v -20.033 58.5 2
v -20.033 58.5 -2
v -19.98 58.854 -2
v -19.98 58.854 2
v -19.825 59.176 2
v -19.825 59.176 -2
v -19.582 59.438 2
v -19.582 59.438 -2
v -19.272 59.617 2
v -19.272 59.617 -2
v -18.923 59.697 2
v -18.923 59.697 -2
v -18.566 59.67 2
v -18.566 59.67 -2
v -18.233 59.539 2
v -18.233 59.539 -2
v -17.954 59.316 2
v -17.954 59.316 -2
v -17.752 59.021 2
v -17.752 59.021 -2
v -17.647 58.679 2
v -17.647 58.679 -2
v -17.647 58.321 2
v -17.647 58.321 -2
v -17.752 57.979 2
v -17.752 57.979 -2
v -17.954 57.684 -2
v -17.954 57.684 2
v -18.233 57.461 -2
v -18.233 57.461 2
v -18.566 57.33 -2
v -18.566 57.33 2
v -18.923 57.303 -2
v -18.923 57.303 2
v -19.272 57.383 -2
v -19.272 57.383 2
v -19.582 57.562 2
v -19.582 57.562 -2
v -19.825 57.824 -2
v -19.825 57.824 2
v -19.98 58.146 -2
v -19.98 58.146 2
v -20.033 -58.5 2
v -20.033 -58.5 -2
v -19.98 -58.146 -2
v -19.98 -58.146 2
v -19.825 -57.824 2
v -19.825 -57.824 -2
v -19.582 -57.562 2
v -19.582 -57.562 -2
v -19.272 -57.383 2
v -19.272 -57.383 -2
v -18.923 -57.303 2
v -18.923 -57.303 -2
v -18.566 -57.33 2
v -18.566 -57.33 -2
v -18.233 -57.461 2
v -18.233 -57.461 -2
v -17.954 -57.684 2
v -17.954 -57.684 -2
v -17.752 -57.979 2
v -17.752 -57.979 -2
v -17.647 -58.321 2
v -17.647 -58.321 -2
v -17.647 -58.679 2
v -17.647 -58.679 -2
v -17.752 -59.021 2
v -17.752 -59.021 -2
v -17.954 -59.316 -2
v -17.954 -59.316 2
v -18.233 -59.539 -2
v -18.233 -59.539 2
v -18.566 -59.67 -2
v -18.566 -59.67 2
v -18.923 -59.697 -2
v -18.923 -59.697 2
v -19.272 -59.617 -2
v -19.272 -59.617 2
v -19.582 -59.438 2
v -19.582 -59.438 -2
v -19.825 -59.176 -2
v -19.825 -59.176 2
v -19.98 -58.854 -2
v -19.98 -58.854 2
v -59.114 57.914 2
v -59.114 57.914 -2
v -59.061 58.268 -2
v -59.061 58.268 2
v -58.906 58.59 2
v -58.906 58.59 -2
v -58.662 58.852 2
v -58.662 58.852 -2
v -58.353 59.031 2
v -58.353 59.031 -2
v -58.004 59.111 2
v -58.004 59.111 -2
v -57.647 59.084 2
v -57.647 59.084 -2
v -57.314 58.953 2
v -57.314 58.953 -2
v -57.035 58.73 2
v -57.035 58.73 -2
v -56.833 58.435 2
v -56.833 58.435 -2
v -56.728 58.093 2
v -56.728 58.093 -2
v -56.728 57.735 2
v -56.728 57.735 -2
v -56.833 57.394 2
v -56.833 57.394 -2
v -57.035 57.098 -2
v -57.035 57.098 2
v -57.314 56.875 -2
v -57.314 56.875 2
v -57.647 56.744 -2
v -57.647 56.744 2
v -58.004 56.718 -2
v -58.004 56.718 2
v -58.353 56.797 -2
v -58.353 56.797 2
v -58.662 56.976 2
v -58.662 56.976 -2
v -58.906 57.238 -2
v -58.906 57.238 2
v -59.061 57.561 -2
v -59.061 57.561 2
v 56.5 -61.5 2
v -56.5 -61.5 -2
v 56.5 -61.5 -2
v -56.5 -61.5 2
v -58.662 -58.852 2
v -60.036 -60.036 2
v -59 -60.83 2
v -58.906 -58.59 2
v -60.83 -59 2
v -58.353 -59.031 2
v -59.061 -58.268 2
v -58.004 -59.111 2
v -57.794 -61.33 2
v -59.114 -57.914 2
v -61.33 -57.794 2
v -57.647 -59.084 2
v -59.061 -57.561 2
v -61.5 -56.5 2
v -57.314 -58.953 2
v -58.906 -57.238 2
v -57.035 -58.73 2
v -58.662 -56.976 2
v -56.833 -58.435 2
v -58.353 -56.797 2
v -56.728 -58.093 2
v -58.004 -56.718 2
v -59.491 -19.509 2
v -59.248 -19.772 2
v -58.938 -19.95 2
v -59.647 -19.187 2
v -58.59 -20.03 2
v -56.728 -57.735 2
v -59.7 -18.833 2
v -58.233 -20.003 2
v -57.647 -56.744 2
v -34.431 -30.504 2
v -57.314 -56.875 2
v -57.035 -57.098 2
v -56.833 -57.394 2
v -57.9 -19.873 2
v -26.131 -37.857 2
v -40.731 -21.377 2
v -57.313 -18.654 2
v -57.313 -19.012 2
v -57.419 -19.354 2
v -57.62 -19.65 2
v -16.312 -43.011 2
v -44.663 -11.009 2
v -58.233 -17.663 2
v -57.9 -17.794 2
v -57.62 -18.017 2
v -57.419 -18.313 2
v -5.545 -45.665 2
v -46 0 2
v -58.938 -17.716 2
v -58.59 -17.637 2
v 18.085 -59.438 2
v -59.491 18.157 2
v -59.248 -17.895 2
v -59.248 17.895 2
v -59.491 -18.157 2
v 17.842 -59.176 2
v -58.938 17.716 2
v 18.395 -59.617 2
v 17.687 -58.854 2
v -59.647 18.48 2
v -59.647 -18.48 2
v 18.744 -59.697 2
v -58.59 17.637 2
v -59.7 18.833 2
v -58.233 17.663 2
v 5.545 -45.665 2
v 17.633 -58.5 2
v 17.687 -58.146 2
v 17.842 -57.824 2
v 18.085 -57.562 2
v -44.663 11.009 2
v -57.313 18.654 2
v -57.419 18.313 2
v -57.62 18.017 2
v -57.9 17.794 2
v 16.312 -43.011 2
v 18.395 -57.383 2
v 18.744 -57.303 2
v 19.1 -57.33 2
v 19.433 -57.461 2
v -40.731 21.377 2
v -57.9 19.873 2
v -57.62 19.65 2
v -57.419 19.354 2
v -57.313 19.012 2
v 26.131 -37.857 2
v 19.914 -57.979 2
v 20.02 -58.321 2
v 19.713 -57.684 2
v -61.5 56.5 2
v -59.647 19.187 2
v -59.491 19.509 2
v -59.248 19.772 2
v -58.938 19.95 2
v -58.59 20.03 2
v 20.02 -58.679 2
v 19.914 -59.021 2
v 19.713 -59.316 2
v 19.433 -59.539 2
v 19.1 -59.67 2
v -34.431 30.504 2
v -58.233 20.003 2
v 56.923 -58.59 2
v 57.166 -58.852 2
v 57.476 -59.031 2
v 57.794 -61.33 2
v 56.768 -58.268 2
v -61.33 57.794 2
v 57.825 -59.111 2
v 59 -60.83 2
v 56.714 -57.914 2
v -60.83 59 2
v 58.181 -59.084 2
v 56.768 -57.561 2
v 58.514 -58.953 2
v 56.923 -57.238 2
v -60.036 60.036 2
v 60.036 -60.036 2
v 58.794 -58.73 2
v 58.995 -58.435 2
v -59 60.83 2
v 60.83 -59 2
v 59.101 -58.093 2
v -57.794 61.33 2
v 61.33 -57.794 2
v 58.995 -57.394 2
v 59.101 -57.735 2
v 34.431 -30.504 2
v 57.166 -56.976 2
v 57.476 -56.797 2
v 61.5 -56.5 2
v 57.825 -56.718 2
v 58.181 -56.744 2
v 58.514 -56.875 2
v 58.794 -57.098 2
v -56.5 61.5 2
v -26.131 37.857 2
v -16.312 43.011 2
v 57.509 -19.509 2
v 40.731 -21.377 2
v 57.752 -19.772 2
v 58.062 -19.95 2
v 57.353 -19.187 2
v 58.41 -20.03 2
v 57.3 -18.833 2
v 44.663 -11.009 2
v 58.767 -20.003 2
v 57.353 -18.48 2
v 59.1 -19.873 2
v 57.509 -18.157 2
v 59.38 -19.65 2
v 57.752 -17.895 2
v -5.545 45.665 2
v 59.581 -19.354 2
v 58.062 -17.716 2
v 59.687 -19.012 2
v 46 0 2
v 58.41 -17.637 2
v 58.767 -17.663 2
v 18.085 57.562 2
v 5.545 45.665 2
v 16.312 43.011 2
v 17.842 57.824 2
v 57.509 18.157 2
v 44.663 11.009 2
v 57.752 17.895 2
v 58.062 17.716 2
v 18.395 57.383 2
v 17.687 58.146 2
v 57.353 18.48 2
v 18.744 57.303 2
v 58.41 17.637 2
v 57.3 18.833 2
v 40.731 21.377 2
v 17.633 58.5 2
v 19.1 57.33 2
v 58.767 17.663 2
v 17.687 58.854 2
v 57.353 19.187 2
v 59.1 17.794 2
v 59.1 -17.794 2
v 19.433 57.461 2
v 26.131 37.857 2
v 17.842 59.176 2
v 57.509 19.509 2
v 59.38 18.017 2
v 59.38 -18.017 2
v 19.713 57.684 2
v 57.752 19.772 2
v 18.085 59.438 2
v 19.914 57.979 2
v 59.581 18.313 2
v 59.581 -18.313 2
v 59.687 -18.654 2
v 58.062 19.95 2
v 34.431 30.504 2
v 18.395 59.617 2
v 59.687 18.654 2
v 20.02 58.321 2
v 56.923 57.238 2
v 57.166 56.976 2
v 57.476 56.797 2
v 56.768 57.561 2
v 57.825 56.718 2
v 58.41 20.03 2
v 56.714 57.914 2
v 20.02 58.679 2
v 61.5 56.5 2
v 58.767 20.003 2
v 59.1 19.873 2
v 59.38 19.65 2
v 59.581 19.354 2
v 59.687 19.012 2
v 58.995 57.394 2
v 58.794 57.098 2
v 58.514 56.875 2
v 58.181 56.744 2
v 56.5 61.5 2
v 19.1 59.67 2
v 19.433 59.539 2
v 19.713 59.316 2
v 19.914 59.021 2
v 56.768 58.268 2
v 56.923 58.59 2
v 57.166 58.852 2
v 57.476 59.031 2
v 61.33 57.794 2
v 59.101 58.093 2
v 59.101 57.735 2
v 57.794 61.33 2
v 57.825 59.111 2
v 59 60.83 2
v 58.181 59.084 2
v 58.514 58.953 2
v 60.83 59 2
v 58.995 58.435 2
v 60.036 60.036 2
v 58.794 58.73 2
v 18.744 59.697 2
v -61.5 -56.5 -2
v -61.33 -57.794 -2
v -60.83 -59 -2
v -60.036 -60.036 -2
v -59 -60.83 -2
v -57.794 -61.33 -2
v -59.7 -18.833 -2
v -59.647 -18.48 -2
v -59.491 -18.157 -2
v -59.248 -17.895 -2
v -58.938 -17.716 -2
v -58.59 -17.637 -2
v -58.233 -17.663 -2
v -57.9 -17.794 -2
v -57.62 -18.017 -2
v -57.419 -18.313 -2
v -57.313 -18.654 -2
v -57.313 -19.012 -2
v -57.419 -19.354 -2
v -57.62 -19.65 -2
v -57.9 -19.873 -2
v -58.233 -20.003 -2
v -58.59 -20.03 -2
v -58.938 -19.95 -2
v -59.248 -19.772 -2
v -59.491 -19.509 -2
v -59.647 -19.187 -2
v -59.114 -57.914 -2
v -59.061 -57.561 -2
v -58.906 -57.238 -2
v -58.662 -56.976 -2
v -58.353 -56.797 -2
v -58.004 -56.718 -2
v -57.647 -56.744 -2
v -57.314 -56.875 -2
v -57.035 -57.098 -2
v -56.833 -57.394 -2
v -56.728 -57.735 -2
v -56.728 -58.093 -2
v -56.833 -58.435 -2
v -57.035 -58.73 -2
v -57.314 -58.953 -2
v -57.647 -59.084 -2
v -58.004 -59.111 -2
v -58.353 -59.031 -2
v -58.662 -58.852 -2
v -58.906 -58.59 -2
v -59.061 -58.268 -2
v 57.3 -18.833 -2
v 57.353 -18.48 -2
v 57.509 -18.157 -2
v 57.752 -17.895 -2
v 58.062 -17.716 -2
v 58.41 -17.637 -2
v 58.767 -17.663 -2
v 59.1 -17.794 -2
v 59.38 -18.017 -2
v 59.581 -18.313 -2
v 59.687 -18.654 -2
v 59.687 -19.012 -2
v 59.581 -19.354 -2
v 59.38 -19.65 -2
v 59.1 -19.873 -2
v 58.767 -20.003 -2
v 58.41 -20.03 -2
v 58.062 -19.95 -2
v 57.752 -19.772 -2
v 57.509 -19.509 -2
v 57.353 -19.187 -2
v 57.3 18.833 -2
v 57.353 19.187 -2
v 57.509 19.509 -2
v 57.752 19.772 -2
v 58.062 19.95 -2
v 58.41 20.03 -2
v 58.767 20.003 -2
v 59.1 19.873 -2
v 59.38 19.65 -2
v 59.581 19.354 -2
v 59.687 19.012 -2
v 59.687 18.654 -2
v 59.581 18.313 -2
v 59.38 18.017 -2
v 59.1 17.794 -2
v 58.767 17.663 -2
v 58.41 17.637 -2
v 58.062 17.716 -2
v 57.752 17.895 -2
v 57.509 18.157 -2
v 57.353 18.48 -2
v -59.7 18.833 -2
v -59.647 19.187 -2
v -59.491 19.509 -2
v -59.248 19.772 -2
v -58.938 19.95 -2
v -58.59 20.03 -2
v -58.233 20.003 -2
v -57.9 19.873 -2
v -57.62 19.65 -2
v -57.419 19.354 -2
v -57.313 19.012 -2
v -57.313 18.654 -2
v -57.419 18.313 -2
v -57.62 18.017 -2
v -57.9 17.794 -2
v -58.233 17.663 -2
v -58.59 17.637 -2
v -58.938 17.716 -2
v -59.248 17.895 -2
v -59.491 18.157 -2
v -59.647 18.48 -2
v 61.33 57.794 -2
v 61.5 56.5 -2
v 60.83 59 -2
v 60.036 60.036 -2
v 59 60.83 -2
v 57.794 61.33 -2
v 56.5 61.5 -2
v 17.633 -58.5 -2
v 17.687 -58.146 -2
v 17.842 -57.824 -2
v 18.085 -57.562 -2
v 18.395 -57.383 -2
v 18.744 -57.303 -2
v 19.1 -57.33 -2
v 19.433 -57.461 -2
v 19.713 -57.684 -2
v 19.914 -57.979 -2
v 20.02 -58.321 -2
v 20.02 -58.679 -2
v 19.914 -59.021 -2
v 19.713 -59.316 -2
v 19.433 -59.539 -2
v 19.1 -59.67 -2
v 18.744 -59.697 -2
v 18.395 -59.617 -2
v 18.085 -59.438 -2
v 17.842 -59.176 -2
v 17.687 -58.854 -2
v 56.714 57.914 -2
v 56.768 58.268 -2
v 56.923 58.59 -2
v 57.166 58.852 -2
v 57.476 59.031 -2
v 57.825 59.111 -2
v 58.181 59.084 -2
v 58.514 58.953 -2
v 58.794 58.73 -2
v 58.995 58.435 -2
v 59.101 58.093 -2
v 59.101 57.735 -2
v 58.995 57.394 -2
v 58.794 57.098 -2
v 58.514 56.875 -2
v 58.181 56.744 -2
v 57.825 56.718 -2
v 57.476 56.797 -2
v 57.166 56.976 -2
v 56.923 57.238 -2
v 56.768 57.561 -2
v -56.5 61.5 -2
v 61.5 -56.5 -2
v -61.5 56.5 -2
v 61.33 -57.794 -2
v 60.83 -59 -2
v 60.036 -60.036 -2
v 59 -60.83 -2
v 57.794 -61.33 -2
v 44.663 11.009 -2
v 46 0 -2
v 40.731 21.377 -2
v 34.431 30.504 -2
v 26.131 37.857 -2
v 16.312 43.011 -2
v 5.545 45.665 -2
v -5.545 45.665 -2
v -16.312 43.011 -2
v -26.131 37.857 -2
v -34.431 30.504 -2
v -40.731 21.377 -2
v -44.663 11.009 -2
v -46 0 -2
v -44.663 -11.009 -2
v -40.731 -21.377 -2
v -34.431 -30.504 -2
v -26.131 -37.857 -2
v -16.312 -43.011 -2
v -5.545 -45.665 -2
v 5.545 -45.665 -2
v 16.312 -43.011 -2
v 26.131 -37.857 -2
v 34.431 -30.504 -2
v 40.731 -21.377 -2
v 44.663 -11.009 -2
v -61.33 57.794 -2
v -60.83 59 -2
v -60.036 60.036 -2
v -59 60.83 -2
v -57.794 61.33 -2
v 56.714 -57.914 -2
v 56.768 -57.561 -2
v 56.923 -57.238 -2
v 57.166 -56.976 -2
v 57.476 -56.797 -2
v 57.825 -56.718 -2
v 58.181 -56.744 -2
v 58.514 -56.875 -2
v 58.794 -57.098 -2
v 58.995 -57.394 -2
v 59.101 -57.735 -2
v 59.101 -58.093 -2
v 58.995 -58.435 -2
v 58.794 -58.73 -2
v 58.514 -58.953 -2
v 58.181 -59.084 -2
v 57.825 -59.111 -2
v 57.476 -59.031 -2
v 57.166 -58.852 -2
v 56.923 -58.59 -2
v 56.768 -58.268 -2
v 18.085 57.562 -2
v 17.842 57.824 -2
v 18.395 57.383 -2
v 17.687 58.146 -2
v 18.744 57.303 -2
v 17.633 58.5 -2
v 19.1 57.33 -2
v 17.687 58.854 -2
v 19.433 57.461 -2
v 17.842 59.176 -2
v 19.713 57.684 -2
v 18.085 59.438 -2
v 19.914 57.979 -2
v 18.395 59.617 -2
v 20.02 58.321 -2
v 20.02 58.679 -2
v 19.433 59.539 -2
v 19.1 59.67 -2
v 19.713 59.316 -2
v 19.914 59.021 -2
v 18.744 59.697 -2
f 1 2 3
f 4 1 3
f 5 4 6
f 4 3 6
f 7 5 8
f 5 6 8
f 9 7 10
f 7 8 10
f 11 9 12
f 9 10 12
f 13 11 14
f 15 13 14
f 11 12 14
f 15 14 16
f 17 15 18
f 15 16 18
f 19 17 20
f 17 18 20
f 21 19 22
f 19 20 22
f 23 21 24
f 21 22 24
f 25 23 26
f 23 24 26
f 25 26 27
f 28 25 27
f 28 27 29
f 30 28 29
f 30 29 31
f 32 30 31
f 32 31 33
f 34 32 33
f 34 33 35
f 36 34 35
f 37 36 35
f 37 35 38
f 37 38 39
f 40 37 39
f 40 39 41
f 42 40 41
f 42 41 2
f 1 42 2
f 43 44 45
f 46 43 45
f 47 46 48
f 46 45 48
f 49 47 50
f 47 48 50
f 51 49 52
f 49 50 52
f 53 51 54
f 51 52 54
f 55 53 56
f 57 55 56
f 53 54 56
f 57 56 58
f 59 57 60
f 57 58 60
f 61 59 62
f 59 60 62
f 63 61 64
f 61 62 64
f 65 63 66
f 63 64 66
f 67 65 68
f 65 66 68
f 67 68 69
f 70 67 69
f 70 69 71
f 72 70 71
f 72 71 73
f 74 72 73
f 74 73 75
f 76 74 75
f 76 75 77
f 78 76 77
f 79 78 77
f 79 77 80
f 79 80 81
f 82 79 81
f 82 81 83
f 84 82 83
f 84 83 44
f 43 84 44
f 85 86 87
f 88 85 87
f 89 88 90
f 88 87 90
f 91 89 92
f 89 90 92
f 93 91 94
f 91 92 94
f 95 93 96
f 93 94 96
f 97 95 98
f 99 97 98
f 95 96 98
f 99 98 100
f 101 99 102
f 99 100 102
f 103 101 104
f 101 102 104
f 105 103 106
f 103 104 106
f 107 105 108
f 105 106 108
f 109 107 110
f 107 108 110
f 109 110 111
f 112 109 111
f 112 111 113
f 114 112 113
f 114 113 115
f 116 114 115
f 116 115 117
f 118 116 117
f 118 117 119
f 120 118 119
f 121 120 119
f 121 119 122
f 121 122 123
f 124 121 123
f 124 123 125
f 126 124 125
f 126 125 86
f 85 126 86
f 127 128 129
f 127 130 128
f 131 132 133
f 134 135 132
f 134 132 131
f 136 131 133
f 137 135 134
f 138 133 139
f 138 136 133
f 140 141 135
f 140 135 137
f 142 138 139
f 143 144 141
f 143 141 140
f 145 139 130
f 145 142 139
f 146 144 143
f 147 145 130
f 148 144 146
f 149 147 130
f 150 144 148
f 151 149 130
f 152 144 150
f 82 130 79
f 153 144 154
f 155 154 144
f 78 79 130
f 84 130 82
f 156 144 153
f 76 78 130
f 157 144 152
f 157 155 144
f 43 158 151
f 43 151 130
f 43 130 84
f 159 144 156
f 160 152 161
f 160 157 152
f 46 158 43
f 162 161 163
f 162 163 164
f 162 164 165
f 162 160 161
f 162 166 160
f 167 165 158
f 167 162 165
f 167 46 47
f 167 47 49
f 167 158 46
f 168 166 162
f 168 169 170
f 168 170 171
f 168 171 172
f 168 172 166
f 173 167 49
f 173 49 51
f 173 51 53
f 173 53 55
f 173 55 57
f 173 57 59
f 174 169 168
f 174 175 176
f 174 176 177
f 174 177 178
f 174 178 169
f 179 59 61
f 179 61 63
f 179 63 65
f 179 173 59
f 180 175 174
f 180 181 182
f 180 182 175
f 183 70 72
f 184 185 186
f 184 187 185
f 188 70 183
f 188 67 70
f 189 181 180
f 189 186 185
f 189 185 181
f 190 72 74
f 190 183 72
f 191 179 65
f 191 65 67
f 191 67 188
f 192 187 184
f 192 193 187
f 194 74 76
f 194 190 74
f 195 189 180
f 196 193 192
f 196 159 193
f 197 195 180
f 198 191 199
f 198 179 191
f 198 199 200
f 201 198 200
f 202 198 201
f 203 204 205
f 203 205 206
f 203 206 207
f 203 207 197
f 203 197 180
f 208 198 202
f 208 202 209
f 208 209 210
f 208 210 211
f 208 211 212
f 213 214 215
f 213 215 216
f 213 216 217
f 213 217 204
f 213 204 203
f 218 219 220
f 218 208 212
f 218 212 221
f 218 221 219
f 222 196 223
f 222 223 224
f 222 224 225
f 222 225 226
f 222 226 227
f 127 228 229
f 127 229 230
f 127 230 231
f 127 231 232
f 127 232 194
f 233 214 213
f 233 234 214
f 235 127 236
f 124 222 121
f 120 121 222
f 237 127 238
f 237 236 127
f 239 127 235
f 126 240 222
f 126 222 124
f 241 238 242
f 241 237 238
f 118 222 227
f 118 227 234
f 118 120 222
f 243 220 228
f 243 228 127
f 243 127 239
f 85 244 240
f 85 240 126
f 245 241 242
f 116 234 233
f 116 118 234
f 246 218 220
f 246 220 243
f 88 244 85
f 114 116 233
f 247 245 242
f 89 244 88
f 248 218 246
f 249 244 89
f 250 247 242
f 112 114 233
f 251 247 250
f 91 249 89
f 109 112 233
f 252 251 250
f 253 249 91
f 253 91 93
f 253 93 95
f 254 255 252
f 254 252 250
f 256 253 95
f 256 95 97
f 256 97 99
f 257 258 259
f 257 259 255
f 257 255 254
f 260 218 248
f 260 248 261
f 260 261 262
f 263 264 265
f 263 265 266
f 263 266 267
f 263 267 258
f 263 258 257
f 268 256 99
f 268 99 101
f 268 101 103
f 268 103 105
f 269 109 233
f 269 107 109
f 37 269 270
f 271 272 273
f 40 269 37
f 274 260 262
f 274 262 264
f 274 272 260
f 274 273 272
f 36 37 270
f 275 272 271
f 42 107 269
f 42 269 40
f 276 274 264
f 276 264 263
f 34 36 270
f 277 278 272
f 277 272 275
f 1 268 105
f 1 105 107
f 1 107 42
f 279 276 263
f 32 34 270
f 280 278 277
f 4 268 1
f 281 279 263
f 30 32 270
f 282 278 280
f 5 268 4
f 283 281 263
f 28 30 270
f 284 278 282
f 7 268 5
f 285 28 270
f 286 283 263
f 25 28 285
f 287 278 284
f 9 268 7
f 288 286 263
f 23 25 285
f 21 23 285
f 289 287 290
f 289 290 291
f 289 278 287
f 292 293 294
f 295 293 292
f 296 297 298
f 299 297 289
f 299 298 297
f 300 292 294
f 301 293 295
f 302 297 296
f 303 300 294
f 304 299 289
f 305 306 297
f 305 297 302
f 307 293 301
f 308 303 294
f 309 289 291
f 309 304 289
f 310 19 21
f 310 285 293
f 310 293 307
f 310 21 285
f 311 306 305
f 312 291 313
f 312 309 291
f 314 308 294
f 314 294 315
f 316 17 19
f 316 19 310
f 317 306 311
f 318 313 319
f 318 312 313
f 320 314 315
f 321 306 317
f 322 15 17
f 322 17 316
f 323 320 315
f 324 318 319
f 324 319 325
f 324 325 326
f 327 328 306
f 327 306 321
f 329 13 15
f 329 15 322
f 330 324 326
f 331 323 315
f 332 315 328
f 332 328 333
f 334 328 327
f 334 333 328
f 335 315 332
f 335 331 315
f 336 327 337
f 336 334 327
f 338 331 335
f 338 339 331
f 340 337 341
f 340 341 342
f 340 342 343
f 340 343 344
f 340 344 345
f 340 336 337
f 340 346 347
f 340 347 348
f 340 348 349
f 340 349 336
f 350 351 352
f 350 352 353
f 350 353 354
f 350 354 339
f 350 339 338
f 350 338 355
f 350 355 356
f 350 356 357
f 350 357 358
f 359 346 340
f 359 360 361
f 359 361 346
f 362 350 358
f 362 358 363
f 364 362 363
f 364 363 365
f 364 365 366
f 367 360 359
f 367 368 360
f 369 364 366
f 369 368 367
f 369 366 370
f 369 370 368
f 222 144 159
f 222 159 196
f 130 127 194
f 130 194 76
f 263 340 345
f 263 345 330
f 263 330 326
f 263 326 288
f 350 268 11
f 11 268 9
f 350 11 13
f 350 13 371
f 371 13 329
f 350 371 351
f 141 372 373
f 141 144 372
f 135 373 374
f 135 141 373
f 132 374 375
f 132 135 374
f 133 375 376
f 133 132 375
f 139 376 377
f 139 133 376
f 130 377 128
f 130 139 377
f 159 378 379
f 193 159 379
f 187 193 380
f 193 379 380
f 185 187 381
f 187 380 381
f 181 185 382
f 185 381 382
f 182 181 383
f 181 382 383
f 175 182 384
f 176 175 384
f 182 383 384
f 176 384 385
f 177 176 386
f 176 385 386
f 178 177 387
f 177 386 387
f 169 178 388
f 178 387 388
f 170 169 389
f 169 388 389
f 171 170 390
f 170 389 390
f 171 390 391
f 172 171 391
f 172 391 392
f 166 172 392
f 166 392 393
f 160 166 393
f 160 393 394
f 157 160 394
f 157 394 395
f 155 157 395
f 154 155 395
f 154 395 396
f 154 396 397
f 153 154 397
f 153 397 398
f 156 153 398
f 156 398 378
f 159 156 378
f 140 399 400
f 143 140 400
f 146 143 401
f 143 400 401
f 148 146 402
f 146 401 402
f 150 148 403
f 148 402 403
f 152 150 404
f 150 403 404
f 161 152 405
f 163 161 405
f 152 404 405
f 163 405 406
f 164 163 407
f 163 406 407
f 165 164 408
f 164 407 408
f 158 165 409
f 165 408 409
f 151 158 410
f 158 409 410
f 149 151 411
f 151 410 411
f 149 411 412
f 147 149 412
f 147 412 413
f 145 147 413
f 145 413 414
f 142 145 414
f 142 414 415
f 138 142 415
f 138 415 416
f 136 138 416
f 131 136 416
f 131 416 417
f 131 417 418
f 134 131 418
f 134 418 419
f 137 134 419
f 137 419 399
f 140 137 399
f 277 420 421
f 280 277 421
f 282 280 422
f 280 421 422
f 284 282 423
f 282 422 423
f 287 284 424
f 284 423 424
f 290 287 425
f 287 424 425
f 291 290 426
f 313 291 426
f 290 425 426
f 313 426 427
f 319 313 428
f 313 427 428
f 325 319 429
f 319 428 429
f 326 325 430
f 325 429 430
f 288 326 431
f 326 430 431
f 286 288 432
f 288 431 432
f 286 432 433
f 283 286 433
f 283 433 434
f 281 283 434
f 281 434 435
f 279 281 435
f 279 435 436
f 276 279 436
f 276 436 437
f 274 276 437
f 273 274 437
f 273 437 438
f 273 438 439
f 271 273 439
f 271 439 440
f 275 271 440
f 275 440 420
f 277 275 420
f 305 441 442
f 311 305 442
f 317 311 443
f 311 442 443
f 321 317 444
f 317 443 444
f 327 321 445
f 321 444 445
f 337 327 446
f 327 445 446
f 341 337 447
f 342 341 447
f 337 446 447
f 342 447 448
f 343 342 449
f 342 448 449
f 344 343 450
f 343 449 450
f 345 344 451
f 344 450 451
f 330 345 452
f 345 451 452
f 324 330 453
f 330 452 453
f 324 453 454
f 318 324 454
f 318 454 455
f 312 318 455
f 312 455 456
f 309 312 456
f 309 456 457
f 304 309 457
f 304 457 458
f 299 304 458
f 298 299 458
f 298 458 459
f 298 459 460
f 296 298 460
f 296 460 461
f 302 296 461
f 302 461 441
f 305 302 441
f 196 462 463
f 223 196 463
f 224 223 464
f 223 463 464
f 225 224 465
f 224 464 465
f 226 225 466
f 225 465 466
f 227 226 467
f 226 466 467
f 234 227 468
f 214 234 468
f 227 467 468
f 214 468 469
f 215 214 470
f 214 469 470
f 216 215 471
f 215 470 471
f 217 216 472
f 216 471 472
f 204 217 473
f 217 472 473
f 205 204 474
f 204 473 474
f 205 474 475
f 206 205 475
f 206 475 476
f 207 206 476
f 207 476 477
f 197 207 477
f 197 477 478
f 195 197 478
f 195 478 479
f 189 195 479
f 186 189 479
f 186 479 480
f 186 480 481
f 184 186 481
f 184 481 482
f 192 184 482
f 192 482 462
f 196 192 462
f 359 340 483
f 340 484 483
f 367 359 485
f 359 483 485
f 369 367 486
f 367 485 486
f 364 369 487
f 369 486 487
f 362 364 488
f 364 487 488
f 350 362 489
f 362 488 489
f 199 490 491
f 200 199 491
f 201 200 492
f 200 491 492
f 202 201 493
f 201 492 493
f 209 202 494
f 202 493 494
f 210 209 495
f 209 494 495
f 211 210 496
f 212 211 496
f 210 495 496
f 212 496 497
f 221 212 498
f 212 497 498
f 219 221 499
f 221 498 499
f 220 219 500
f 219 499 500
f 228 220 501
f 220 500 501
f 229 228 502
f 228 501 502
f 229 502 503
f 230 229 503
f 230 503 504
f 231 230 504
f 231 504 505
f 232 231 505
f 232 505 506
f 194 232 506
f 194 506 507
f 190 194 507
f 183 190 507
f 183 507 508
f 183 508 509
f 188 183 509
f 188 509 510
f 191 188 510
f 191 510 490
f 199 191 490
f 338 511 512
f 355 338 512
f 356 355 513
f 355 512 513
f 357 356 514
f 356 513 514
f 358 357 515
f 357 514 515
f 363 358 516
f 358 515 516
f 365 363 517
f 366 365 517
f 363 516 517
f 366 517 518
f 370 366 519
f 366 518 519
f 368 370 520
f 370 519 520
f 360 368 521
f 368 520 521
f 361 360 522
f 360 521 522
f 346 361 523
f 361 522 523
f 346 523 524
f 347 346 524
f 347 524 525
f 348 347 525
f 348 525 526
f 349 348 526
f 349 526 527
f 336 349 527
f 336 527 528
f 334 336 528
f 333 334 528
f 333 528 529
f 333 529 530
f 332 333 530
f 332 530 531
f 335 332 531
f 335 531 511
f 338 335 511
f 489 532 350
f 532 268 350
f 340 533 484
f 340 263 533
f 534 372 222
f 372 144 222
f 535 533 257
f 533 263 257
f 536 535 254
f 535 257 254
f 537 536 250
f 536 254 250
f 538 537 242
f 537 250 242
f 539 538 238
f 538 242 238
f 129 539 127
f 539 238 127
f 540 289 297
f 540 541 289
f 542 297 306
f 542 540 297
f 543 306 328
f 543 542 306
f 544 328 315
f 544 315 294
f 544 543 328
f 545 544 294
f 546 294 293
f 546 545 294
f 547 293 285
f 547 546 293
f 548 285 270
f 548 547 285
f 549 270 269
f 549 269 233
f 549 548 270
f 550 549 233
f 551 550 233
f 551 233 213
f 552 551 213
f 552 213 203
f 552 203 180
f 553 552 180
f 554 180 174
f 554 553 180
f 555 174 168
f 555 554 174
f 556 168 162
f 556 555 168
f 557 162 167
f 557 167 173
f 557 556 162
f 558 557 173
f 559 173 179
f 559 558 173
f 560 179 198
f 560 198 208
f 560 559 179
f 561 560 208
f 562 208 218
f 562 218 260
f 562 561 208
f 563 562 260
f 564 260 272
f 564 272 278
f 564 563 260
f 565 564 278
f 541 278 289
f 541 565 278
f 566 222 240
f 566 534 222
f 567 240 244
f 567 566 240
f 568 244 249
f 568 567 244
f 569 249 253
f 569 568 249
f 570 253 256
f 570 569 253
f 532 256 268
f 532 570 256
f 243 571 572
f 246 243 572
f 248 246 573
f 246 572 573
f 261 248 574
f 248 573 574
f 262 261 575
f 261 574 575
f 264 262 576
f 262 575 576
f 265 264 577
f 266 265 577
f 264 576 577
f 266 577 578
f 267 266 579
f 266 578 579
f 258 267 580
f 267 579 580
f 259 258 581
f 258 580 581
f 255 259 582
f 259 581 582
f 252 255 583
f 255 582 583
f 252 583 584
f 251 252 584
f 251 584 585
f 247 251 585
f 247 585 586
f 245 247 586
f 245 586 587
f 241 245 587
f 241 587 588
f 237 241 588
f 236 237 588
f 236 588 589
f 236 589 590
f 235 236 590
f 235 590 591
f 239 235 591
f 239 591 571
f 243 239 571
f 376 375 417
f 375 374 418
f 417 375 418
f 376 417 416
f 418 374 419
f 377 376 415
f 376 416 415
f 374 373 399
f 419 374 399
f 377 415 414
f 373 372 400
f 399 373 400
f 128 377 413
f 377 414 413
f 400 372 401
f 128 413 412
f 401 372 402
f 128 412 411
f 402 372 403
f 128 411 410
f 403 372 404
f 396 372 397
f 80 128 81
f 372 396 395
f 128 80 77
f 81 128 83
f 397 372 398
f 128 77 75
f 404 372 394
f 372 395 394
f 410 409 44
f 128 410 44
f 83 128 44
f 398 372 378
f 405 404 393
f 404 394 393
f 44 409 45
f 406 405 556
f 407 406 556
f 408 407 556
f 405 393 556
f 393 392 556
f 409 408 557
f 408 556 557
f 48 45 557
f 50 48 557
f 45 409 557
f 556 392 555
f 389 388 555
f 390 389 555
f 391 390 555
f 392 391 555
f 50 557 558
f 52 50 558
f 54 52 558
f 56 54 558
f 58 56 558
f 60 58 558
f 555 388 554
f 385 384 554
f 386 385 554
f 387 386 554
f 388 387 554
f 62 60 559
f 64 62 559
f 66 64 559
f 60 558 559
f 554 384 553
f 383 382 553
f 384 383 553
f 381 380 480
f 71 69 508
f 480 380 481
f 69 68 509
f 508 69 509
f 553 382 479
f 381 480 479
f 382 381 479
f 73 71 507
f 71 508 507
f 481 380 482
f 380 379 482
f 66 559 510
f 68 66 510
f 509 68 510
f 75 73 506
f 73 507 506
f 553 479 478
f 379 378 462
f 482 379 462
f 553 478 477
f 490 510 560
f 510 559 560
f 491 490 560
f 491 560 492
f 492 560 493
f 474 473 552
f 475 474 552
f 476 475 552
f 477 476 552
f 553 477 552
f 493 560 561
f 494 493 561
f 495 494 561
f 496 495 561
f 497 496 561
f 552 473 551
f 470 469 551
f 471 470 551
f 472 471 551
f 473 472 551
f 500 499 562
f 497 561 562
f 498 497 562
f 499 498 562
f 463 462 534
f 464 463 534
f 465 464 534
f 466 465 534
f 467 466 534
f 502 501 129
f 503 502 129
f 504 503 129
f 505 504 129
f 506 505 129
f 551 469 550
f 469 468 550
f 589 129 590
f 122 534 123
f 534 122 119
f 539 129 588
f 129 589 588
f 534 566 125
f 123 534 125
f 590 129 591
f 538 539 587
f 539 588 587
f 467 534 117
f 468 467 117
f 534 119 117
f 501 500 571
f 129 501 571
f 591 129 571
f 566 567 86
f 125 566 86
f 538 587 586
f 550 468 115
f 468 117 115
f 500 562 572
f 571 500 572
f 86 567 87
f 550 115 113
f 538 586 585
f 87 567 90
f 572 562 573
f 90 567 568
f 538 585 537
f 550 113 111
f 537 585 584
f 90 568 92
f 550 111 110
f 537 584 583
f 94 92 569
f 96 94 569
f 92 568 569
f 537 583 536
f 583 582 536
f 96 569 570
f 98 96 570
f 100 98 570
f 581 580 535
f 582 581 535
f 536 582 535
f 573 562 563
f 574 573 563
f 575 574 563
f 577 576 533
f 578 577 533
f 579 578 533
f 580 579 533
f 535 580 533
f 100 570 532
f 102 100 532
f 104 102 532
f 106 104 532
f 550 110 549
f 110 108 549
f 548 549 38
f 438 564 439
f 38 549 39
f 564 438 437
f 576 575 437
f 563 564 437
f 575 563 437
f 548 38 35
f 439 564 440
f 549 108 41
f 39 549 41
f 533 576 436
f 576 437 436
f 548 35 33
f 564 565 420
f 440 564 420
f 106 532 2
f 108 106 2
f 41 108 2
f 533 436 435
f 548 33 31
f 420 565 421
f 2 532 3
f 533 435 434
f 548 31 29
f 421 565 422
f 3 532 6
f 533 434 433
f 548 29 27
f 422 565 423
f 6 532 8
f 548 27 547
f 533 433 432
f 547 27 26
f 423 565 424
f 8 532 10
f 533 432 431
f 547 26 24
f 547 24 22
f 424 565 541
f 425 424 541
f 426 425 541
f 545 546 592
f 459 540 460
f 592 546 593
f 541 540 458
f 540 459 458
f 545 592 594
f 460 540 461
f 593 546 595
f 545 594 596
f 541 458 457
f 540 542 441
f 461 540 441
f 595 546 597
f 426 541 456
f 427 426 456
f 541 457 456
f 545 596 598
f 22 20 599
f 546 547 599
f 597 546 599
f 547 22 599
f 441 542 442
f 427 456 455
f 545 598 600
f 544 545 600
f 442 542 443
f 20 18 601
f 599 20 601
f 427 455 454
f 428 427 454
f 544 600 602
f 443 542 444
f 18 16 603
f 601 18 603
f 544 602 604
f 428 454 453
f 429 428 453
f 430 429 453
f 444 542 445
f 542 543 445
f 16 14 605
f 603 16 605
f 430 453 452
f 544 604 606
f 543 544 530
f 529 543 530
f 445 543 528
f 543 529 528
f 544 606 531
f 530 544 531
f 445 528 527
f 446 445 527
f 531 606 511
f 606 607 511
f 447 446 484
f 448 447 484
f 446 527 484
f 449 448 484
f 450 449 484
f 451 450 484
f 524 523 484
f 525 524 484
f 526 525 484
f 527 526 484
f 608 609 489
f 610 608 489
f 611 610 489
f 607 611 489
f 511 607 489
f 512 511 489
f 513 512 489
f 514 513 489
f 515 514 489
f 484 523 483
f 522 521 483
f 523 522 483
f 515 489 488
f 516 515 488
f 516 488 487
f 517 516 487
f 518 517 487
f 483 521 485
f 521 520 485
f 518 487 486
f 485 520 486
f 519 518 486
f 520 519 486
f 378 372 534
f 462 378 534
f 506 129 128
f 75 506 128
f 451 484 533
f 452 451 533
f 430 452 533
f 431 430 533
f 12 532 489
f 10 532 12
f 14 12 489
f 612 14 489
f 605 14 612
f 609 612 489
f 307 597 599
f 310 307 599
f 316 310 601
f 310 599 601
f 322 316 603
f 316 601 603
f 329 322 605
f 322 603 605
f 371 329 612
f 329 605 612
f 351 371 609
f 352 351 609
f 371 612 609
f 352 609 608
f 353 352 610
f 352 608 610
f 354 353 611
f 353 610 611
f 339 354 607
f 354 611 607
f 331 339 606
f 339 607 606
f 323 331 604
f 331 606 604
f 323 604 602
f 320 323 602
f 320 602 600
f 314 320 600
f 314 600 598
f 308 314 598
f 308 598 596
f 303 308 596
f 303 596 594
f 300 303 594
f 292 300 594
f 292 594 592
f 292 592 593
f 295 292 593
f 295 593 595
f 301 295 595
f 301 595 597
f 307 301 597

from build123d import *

# Parameters (mm, degrees)
SKETCH1_W                = 123
SKETCH1_H                = 123
SKETCH1_R                = 46
BOSS_EXTRUDE1_DEPTH      = 2
FILLET1_R                = 5
M2_CLEARANCE_HOLE1_D     = 2.4
M2_CLEARANCE_HOLE1_DEPTH = 4


with BuildPart() as part:
    # Sketch1 → Boss-Extrude1 (new body, symmetric)
    with BuildSketch(Plane.XY):
        Rectangle(SKETCH1_W, SKETCH1_H)
        Circle(SKETCH1_R, mode=Mode.SUBTRACT)
    extrude(amount=BOSS_EXTRUDE1_DEPTH, both=True)

    # Fillet1
    fillet1_edges = [part.edges().sort_by_distance(p)[0] for p in [
        (-61.5, -61.5, 0),
        (-61.5, 61.5, 0),
        (61.5, 61.5, 0),
        (61.5, -61.5, 0),
    ]]
    fillet(fillet1_edges, radius=FILLET1_R)

    # M2 Clearance Hole1
    with Locations(Plane.XY.offset(2)):
        with Locations((58.5, -18.833333333), (-57.914213562, 57.914213562), (57.914213562, 57.914213562), (57.914213562, -57.914213562), (-57.914213562, -57.914213562), (-18.833333333, -58.5), (18.833333333, -58.5), (-58.5, -18.833333333), (-58.5, 18.833333333), (-18.833333333, 58.5), (18.833333333, 58.5), (58.5, 18.833333333)):
            Hole(M2_CLEARANCE_HOLE1_D / 2, depth=M2_CLEARANCE_HOLE1_DEPTH)


solid = part.part
